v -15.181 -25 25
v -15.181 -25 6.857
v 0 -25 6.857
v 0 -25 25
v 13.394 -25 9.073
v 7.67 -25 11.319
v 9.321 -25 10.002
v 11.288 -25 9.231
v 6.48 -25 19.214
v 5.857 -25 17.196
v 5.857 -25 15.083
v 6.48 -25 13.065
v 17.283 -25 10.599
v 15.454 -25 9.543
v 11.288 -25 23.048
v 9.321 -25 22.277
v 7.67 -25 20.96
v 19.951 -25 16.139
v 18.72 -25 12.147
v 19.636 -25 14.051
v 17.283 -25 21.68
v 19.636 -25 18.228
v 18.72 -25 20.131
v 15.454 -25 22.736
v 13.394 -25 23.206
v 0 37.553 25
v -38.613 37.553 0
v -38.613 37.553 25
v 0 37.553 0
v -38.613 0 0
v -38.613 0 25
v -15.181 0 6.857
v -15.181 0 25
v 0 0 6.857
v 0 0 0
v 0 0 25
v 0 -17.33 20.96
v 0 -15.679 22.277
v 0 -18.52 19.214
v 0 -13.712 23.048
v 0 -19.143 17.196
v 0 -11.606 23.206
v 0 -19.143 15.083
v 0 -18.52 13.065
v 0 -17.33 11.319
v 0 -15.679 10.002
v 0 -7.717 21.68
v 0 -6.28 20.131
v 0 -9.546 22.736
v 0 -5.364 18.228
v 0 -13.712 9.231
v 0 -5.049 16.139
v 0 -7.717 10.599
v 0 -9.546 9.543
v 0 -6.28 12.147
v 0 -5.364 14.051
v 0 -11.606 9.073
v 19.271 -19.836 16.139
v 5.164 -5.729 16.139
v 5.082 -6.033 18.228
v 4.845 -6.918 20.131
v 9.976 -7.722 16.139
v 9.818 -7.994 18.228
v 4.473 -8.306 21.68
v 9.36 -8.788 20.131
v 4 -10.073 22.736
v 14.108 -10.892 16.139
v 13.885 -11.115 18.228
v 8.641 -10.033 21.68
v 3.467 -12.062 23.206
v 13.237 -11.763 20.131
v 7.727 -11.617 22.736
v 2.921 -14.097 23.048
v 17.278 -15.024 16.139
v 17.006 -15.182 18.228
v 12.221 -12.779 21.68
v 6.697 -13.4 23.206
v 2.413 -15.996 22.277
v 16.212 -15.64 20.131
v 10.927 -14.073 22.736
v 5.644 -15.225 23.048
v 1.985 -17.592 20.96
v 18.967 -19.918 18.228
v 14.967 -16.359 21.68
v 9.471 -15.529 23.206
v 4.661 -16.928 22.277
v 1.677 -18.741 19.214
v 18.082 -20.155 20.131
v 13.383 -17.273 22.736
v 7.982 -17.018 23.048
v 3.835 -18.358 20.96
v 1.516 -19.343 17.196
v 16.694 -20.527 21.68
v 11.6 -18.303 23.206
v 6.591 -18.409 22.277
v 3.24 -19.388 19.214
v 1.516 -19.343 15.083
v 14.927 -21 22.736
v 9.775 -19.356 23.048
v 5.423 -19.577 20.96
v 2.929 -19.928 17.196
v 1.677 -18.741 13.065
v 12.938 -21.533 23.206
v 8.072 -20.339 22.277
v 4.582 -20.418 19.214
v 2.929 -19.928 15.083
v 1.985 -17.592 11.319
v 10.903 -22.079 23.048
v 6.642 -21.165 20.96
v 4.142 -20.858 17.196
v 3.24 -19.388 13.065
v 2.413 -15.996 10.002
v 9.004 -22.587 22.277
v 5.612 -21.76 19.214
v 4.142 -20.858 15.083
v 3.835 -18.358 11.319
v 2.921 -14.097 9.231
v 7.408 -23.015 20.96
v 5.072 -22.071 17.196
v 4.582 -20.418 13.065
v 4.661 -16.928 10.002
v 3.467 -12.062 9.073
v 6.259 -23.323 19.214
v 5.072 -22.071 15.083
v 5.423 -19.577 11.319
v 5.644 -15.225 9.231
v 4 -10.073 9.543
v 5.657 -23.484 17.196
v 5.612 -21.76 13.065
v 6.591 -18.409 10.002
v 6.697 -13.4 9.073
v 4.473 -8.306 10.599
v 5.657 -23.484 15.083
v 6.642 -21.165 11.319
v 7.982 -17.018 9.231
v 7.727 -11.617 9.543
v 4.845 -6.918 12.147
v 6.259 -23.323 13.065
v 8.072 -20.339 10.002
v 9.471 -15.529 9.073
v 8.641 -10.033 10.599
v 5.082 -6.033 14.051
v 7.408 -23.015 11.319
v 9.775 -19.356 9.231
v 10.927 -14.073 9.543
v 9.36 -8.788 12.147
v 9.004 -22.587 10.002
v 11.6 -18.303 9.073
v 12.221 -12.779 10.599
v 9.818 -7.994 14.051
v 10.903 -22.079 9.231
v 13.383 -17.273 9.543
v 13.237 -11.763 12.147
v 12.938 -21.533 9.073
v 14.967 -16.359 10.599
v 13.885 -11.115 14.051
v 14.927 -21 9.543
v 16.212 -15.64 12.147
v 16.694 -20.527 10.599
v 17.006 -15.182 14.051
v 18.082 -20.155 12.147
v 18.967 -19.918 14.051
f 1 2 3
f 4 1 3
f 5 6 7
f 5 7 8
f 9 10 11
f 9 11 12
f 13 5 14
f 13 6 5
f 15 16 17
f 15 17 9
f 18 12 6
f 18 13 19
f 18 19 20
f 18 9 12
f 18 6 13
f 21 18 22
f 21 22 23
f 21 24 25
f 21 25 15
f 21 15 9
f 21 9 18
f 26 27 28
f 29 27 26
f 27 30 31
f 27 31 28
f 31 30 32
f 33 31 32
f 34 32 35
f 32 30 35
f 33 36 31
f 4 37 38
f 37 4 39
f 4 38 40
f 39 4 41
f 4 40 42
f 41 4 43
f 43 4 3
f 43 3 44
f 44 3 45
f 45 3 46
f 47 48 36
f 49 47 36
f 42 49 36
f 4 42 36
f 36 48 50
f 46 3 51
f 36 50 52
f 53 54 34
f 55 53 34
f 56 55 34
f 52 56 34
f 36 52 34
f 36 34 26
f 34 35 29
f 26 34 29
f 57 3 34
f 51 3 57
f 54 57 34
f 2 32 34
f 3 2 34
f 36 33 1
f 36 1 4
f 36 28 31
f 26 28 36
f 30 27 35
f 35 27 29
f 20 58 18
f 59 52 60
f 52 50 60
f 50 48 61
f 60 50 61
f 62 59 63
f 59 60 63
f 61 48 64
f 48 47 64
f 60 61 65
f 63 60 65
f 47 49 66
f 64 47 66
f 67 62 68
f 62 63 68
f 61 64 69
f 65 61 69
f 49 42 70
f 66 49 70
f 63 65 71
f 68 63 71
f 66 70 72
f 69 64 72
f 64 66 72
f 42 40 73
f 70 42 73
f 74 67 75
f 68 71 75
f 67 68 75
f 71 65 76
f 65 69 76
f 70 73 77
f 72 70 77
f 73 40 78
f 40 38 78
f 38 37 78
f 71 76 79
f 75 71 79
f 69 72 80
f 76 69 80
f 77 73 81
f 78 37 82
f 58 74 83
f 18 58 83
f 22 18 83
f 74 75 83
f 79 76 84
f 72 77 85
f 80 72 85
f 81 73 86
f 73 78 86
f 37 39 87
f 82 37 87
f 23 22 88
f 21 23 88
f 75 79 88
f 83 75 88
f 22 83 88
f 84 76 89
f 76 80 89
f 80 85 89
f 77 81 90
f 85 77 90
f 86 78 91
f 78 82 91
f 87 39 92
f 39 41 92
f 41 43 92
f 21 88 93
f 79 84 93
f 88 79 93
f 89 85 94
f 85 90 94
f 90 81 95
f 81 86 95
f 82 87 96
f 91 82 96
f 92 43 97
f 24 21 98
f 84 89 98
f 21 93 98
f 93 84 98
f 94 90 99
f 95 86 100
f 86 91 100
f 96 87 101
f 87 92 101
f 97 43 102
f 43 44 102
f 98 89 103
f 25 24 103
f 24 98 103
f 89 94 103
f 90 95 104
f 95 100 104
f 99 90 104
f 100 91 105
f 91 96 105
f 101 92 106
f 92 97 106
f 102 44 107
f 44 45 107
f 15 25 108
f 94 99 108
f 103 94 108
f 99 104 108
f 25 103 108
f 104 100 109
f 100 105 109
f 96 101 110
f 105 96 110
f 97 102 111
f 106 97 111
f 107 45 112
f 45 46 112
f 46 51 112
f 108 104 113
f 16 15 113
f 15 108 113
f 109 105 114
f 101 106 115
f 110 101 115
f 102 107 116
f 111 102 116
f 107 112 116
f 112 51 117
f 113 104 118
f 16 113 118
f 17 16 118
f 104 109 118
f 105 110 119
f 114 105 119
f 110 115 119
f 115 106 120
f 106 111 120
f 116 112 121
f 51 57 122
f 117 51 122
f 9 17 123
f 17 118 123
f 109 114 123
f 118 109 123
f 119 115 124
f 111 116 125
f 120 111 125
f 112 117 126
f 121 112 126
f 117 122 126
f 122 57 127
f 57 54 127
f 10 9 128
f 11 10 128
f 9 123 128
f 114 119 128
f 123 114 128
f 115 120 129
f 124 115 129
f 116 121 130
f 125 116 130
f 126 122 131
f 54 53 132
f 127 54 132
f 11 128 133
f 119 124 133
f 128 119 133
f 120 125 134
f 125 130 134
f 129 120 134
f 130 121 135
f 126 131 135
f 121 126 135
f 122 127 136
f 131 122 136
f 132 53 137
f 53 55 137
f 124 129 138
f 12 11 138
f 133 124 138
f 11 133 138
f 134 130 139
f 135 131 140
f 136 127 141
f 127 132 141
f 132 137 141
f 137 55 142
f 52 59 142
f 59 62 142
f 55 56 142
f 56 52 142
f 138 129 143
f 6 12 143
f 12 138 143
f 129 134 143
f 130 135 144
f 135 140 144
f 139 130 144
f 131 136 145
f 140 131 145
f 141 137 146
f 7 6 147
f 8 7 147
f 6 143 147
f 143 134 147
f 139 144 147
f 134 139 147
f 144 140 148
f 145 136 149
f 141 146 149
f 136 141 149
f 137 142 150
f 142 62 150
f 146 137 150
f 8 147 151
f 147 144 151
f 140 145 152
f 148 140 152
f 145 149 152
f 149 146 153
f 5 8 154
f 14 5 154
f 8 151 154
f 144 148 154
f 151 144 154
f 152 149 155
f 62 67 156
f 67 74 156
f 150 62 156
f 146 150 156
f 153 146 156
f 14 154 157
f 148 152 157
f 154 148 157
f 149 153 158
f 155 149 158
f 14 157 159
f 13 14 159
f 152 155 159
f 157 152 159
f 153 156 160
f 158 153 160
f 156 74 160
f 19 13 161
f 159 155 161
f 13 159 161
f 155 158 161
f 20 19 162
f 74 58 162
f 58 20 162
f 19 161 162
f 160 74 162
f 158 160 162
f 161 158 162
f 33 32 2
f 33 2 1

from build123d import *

# Parameters (mm, degrees)
F0_W     = 38.61342
F0_H     = 37.553012
F1_DEPTH = 25
F2_W     = 15.180568
F2_H     = 18.142793
F3_DEPTH = 25
F4_R     = 7.086632
F5_ANGLE = 90


with BuildPart() as f1:
    # F0 (on Top) → F1 (new body)
    with BuildSketch(Plane.XY):
        with Locations((-19.30671, 18.776506)):
            Rectangle(F0_W, F0_H)
    extrude(amount=F1_DEPTH)

    # F2 (on face) → F3 (join)
    with BuildSketch(Plane.XZ):
        with Locations((-7.590284, 15.928603)):
            Rectangle(F2_W, F2_H)
    extrude(amount=F3_DEPTH)

    # F4 (on face) → F5 (revolve)
    with BuildSketch(Plane.YZ):
        with Locations((-12.13547, 16.139457)):
            Circle(F4_R)
    revolve(axis=Axis((0, -25, 15.928603), (0, 0, -1)), revolution_arc=F5_ANGLE)


solid = f1.part
